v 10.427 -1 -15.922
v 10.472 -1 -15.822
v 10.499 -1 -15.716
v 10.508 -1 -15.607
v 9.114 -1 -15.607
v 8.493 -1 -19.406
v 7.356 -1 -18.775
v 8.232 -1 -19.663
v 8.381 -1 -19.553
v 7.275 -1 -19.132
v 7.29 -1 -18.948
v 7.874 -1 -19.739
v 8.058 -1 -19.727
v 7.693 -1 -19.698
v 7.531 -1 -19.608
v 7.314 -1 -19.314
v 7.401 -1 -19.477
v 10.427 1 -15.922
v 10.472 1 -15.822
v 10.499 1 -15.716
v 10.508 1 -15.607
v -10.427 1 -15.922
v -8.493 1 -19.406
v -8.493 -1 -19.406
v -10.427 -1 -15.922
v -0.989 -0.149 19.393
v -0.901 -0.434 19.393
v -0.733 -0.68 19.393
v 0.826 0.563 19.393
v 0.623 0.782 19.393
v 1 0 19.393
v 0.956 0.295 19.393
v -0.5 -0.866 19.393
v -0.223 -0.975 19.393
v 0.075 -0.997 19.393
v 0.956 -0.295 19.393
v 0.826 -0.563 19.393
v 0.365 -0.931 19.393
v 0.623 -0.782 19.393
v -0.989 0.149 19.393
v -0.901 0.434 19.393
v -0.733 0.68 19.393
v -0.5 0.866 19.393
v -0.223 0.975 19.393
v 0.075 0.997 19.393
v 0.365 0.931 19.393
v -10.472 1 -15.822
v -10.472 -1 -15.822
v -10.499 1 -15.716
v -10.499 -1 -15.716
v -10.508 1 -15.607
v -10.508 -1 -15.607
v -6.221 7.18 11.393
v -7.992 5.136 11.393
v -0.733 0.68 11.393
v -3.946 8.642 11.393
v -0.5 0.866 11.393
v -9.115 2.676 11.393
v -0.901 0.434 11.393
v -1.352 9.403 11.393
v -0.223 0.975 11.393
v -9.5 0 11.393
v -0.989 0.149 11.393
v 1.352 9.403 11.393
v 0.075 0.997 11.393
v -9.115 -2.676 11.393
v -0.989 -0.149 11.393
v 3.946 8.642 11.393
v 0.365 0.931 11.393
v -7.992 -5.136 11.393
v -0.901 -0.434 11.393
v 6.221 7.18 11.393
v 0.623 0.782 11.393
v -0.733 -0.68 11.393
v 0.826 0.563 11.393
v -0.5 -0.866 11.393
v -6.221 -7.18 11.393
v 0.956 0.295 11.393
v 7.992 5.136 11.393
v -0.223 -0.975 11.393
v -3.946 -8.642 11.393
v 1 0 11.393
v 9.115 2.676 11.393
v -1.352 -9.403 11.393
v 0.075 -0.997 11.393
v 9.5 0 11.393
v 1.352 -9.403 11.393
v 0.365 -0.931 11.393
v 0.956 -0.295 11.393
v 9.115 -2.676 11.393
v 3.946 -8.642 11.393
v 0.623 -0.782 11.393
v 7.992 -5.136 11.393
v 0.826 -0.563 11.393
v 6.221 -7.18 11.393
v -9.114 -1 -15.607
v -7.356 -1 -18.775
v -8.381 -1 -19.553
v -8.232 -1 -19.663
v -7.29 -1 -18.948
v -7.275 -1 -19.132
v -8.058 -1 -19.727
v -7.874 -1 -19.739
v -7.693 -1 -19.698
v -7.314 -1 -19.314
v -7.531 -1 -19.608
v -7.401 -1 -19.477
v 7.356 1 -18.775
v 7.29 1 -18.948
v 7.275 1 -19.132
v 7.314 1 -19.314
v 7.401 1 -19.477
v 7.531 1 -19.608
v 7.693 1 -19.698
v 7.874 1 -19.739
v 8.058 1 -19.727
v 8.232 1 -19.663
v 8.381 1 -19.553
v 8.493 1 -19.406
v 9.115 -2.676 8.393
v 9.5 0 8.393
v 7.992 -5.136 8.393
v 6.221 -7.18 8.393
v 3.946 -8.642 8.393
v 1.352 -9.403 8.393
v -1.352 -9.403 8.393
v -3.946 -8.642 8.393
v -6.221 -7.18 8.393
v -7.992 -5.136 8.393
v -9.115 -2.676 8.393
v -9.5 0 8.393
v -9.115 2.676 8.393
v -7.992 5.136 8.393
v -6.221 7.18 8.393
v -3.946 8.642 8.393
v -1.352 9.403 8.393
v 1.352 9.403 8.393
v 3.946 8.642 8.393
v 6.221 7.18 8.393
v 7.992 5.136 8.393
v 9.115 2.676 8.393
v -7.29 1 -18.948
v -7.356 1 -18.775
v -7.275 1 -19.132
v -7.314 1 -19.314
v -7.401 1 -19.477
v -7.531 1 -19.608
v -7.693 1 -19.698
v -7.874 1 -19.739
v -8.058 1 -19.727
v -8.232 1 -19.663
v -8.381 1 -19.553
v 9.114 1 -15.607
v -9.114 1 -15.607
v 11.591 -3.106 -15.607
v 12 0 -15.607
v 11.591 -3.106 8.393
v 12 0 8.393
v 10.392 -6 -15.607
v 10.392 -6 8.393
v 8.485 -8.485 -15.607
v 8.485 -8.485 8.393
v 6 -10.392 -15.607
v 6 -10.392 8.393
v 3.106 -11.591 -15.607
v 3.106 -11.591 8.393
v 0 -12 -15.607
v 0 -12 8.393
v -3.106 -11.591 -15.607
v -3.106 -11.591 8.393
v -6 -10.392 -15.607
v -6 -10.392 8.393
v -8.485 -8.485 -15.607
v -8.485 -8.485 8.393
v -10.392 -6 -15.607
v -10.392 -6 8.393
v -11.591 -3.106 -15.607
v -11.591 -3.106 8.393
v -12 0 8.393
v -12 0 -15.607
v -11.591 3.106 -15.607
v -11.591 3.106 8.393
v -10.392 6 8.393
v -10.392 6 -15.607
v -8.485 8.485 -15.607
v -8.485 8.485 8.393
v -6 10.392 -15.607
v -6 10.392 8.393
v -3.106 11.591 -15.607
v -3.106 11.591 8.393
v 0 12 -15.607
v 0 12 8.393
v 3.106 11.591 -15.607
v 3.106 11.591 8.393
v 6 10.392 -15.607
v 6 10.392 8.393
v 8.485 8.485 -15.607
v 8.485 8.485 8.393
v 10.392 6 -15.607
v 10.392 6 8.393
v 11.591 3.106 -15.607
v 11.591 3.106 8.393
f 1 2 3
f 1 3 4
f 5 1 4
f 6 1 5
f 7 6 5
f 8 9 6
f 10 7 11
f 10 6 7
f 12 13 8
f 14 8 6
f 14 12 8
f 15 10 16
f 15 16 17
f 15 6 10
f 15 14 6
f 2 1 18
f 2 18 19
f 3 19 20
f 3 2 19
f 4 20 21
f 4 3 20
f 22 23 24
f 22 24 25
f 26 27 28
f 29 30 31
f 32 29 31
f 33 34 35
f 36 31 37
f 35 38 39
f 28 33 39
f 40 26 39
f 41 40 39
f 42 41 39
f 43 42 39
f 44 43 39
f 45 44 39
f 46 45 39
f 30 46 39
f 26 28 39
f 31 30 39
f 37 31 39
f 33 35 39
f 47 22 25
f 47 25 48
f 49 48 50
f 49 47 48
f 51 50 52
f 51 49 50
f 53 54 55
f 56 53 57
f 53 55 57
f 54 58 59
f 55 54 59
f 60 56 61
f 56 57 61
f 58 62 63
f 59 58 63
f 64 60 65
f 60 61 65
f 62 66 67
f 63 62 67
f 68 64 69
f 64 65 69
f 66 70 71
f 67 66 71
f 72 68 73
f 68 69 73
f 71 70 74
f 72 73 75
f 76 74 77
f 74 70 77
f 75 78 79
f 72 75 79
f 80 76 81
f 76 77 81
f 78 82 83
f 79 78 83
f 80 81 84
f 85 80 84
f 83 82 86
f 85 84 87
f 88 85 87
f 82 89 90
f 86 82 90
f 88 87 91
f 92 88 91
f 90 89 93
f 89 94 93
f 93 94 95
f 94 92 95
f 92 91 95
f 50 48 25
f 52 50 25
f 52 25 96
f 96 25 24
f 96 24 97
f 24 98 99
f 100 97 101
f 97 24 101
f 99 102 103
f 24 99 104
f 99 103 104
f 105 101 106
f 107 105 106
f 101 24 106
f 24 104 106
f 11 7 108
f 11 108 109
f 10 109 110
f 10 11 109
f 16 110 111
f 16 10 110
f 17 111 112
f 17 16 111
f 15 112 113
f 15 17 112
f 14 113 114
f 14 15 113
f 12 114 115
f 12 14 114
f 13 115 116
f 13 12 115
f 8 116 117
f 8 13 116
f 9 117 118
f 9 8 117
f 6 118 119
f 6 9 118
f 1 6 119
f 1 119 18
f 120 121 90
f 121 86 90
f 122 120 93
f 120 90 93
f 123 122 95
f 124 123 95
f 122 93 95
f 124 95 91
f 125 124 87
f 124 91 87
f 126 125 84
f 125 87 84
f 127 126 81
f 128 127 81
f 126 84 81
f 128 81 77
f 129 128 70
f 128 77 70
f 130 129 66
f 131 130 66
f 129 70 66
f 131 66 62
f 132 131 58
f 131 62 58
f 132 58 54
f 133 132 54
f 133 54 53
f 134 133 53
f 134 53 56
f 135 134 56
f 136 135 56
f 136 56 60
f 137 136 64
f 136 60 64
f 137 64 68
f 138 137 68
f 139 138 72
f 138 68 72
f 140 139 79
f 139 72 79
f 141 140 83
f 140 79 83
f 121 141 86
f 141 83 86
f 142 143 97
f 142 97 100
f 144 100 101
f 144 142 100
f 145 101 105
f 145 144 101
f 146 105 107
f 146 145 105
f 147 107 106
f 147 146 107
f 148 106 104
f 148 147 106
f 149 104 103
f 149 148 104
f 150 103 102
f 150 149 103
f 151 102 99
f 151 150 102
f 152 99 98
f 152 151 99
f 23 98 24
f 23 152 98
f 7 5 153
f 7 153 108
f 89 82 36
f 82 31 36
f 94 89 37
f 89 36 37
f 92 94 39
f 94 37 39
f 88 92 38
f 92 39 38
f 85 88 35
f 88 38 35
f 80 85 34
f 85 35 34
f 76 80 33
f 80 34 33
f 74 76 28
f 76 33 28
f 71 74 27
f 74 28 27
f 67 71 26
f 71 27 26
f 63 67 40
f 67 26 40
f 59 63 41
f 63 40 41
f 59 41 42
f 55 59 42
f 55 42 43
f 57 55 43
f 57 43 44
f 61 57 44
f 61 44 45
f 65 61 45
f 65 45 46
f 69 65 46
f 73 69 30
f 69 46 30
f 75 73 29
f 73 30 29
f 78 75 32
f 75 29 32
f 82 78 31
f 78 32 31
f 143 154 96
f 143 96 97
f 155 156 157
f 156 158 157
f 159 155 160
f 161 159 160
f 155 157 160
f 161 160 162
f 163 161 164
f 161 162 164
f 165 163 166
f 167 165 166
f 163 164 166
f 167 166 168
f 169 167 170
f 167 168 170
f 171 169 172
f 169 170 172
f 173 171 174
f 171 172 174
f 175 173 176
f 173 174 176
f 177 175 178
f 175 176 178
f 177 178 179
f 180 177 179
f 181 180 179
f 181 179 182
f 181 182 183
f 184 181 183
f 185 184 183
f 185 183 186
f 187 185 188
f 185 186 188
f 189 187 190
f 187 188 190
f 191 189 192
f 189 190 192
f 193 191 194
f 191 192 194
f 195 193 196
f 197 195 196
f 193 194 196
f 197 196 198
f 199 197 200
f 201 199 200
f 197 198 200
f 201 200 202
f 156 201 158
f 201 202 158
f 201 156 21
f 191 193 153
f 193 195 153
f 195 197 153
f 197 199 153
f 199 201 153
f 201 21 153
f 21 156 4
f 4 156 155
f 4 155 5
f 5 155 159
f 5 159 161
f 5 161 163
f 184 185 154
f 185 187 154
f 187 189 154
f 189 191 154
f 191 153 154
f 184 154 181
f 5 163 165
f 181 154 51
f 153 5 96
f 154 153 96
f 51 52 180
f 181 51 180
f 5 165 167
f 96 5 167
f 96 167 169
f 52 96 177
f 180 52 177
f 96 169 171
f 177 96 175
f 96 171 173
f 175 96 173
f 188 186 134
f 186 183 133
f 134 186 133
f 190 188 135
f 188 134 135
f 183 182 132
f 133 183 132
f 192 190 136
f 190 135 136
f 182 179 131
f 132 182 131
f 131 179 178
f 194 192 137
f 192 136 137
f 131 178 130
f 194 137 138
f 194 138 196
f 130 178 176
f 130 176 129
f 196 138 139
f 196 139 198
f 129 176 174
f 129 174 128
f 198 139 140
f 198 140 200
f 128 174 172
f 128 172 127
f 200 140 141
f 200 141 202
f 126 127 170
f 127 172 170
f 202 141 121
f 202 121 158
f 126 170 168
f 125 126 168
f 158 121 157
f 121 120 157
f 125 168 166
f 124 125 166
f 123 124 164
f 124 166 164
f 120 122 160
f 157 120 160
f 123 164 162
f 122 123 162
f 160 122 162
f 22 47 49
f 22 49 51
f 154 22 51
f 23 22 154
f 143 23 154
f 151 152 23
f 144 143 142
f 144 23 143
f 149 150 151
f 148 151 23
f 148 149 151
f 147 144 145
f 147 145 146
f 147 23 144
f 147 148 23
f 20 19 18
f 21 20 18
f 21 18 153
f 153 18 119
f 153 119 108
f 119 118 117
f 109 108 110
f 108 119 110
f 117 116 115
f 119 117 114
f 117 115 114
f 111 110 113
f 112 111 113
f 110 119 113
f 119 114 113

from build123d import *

# Parameters (mm, degrees)
BOSS_EXTRUDE1_DEPTH = 1


with BuildPart() as part:
    # Sketch1 → Revolve1 (revolve)
    with BuildSketch(Plane(origin=(0, 0, 0), x_dir=(1, 0, 0), z_dir=(0, 1, 0))):
        Polygon((0, 15.606821862), (12, 15.606821862), (12, -8.393178138), (9.5, -8.393178138), (9.5, -11.393178138), (1, -11.393178138), (1, -19.393178138), (0, -19.393178138), align=None)
    revolve(axis=Axis((0, 0, 19.393178138), (0, 0, -1)))

    # Sketch3 → Boss-Extrude1 (add, symmetric)
    with BuildSketch(Plane(origin=(0, 0, 0), x_dir=(1, 0, 0), z_dir=(0, 1, 0))):
        with BuildLine():
            Line((9.289467417, 15.291250115), (7.355842044, 18.774923355))
            ThreePointArc((7.355842044, 18.774923355), (7.60881313, 19.659037934), (8.492927709, 19.406066848))
            Line((8.492927709, 19.406066848), (10.426553083, 15.922393608))
            ThreePointArc((10.426553083, 15.922393608), (10.173581996, 15.038279029), (9.289467417, 15.291250115))
        make_face()
        with BuildLine():
            Line((-9.289467417, 15.291250115), (-7.355842044, 18.774923355))
            ThreePointArc((-7.355842044, 18.774923355), (-7.60881313, 19.659037934), (-8.492927709, 19.406066848))
            Line((-8.492927709, 19.406066848), (-10.426553083, 15.922393608))
            ThreePointArc((-10.426553083, 15.922393608), (-10.173581996, 15.038279029), (-9.289467417, 15.291250115))
        make_face()
    extrude(amount=BOSS_EXTRUDE1_DEPTH, both=True)


solid = part.part
